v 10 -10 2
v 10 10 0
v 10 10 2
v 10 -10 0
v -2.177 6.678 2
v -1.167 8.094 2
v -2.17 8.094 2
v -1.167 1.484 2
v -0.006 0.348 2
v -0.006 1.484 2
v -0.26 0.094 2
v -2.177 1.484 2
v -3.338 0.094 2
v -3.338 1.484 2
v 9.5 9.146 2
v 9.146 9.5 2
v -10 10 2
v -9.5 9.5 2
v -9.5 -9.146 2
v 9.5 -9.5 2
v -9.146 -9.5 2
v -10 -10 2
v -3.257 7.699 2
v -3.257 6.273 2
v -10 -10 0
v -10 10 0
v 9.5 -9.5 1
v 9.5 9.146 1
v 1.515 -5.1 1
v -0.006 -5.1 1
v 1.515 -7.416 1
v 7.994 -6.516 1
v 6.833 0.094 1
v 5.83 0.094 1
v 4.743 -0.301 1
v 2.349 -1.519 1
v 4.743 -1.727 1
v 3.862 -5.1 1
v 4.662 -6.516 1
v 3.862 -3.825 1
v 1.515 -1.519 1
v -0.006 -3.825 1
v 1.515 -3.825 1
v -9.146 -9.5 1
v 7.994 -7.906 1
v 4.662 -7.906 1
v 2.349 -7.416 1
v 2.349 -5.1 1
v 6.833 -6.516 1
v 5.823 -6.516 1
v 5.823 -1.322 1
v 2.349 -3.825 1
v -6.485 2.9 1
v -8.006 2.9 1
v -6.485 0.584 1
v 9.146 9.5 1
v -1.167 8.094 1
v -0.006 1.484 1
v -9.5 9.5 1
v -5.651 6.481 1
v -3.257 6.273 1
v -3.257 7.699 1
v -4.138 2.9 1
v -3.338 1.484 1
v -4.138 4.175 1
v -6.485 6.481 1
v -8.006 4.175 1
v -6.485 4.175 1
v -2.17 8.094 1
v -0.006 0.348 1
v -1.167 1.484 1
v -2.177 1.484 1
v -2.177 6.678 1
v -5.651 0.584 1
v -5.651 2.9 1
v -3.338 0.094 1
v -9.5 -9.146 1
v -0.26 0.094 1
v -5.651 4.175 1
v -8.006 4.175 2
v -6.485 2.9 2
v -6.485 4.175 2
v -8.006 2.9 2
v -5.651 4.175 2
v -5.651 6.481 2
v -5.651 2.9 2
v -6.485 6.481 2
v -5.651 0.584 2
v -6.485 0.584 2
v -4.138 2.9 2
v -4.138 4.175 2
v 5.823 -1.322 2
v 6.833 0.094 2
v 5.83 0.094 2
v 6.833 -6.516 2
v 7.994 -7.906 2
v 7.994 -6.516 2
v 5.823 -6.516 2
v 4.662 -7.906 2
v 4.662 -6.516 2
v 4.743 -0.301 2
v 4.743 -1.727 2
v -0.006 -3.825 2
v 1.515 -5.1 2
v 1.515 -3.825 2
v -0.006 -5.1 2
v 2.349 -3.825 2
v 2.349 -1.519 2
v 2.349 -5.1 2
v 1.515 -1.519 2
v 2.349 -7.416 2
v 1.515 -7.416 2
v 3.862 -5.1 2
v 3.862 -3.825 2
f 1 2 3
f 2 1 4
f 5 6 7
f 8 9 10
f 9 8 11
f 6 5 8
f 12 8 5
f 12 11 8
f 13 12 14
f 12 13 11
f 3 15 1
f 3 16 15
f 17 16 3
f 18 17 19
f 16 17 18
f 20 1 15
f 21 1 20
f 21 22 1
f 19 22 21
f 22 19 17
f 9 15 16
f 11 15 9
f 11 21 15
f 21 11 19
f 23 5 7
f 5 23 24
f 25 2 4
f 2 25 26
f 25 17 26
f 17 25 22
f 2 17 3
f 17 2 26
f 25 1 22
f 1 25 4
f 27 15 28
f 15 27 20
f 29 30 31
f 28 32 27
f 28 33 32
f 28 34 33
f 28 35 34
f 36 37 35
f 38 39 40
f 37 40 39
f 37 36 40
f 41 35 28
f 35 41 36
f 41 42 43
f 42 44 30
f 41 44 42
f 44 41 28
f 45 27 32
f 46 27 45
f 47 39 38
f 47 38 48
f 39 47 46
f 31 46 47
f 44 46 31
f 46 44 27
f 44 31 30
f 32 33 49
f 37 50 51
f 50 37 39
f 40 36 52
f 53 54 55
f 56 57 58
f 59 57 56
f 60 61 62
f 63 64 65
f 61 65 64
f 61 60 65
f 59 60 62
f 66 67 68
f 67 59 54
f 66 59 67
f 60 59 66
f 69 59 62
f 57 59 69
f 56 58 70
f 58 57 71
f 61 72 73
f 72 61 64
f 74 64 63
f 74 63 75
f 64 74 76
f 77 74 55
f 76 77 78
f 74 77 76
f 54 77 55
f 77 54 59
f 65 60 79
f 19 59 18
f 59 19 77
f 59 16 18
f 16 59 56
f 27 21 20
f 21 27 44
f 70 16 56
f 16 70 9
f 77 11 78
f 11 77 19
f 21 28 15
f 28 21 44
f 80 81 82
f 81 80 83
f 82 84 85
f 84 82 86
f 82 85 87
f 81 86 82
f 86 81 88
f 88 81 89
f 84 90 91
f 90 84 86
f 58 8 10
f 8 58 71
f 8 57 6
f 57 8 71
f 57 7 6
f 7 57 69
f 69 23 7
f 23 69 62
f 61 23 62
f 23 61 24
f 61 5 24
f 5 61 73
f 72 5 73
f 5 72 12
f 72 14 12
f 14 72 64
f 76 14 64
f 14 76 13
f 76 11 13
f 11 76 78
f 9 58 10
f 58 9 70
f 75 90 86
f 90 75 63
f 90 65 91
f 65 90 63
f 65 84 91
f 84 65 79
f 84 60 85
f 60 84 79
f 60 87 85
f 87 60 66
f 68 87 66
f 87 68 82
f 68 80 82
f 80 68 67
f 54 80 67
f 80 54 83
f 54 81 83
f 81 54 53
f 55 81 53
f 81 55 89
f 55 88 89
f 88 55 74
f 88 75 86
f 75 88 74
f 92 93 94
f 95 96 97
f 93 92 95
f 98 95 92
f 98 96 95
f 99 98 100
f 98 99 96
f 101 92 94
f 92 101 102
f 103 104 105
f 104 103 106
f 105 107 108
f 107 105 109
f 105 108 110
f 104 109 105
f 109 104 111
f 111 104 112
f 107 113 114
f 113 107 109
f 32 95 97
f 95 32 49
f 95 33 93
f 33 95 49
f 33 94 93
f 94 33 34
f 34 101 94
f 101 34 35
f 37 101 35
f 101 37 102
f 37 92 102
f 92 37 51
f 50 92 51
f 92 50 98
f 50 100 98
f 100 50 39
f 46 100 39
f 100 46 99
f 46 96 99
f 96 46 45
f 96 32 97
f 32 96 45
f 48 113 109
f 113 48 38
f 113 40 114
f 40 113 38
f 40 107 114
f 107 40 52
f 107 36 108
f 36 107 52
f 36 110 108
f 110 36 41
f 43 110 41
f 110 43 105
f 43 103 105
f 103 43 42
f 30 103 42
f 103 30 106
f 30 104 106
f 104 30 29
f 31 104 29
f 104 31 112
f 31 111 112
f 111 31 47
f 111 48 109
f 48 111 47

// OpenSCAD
/*
 *  +X/+X counters for Magic: the Gathering
 */

/* [Value] */

value = "+1"; // ["+1","-1","+5","-5","+10","-10"]

/* [Dimensions] */

edge_len                = 20.0; // [0.1:0.1:100.0]
base_thickness          = 1.0;  // [0.1:0.1:100.0]
base_frame_thickness    = 0.5;  // [0.0:0.1:100.0]
label_margin            = 0.5;  // [0.1:0.1:100.0]
label_bump_height       = 1.0;  // [0.1:0.1:100.0]

/* [Hidden] */

base_plate_total_thickness = base_frame_thickness > 0.0
                           ? base_thickness + label_bump_height
                           : base_thickness;
base_plate_dim = [edge_len, edge_len, base_plate_total_thickness];
base_plate_separator_dim = [
    sqrt(2)*edge_len - base_frame_thickness,
    base_frame_thickness,
    base_thickness + label_bump_height
];

label_cutout_edge_len = edge_len - 2*base_frame_thickness;
label_cutout_dim = [label_cutout_edge_len, label_cutout_edge_len, label_bump_height];

label_padding = base_frame_thickness + label_margin;
label_edge_len = edge_len/2 - 2*label_padding;
label_thickness = base_thickness + label_bump_height;
label_dim = [label_edge_len, label_edge_len, label_thickness];

module base_plate() {
    translate([-edge_len/2, -edge_len/2, 0.0]) {
        difference() {
            cube(base_plate_dim);
            translate([base_frame_thickness, base_frame_thickness, base_thickness]) {
                cube(label_cutout_dim);
            }
        }
    }
    rotate([0.0, 0.0, 45.0]) {
        translate([0.0, 0.0, base_plate_separator_dim.z/2]) {
            cube(base_plate_separator_dim, center=true);
        }
    }
}

module label_text(str) {
    resize(label_dim) {
        linear_extrude(label_thickness) {
            text(str, 10, "FreeMono:style=Bold", halign="center", valign="center");
        }
    }
}

module pxpx_counter(str) {
    base_plate();
    translate([-label_edge_len/2, label_edge_len/2, 0.0]) {
        label_text(str);
    }
    translate([label_edge_len/2, -label_edge_len/2, 0.0]) {
        label_text(str);
    }
}

pxpx_counter(value);
